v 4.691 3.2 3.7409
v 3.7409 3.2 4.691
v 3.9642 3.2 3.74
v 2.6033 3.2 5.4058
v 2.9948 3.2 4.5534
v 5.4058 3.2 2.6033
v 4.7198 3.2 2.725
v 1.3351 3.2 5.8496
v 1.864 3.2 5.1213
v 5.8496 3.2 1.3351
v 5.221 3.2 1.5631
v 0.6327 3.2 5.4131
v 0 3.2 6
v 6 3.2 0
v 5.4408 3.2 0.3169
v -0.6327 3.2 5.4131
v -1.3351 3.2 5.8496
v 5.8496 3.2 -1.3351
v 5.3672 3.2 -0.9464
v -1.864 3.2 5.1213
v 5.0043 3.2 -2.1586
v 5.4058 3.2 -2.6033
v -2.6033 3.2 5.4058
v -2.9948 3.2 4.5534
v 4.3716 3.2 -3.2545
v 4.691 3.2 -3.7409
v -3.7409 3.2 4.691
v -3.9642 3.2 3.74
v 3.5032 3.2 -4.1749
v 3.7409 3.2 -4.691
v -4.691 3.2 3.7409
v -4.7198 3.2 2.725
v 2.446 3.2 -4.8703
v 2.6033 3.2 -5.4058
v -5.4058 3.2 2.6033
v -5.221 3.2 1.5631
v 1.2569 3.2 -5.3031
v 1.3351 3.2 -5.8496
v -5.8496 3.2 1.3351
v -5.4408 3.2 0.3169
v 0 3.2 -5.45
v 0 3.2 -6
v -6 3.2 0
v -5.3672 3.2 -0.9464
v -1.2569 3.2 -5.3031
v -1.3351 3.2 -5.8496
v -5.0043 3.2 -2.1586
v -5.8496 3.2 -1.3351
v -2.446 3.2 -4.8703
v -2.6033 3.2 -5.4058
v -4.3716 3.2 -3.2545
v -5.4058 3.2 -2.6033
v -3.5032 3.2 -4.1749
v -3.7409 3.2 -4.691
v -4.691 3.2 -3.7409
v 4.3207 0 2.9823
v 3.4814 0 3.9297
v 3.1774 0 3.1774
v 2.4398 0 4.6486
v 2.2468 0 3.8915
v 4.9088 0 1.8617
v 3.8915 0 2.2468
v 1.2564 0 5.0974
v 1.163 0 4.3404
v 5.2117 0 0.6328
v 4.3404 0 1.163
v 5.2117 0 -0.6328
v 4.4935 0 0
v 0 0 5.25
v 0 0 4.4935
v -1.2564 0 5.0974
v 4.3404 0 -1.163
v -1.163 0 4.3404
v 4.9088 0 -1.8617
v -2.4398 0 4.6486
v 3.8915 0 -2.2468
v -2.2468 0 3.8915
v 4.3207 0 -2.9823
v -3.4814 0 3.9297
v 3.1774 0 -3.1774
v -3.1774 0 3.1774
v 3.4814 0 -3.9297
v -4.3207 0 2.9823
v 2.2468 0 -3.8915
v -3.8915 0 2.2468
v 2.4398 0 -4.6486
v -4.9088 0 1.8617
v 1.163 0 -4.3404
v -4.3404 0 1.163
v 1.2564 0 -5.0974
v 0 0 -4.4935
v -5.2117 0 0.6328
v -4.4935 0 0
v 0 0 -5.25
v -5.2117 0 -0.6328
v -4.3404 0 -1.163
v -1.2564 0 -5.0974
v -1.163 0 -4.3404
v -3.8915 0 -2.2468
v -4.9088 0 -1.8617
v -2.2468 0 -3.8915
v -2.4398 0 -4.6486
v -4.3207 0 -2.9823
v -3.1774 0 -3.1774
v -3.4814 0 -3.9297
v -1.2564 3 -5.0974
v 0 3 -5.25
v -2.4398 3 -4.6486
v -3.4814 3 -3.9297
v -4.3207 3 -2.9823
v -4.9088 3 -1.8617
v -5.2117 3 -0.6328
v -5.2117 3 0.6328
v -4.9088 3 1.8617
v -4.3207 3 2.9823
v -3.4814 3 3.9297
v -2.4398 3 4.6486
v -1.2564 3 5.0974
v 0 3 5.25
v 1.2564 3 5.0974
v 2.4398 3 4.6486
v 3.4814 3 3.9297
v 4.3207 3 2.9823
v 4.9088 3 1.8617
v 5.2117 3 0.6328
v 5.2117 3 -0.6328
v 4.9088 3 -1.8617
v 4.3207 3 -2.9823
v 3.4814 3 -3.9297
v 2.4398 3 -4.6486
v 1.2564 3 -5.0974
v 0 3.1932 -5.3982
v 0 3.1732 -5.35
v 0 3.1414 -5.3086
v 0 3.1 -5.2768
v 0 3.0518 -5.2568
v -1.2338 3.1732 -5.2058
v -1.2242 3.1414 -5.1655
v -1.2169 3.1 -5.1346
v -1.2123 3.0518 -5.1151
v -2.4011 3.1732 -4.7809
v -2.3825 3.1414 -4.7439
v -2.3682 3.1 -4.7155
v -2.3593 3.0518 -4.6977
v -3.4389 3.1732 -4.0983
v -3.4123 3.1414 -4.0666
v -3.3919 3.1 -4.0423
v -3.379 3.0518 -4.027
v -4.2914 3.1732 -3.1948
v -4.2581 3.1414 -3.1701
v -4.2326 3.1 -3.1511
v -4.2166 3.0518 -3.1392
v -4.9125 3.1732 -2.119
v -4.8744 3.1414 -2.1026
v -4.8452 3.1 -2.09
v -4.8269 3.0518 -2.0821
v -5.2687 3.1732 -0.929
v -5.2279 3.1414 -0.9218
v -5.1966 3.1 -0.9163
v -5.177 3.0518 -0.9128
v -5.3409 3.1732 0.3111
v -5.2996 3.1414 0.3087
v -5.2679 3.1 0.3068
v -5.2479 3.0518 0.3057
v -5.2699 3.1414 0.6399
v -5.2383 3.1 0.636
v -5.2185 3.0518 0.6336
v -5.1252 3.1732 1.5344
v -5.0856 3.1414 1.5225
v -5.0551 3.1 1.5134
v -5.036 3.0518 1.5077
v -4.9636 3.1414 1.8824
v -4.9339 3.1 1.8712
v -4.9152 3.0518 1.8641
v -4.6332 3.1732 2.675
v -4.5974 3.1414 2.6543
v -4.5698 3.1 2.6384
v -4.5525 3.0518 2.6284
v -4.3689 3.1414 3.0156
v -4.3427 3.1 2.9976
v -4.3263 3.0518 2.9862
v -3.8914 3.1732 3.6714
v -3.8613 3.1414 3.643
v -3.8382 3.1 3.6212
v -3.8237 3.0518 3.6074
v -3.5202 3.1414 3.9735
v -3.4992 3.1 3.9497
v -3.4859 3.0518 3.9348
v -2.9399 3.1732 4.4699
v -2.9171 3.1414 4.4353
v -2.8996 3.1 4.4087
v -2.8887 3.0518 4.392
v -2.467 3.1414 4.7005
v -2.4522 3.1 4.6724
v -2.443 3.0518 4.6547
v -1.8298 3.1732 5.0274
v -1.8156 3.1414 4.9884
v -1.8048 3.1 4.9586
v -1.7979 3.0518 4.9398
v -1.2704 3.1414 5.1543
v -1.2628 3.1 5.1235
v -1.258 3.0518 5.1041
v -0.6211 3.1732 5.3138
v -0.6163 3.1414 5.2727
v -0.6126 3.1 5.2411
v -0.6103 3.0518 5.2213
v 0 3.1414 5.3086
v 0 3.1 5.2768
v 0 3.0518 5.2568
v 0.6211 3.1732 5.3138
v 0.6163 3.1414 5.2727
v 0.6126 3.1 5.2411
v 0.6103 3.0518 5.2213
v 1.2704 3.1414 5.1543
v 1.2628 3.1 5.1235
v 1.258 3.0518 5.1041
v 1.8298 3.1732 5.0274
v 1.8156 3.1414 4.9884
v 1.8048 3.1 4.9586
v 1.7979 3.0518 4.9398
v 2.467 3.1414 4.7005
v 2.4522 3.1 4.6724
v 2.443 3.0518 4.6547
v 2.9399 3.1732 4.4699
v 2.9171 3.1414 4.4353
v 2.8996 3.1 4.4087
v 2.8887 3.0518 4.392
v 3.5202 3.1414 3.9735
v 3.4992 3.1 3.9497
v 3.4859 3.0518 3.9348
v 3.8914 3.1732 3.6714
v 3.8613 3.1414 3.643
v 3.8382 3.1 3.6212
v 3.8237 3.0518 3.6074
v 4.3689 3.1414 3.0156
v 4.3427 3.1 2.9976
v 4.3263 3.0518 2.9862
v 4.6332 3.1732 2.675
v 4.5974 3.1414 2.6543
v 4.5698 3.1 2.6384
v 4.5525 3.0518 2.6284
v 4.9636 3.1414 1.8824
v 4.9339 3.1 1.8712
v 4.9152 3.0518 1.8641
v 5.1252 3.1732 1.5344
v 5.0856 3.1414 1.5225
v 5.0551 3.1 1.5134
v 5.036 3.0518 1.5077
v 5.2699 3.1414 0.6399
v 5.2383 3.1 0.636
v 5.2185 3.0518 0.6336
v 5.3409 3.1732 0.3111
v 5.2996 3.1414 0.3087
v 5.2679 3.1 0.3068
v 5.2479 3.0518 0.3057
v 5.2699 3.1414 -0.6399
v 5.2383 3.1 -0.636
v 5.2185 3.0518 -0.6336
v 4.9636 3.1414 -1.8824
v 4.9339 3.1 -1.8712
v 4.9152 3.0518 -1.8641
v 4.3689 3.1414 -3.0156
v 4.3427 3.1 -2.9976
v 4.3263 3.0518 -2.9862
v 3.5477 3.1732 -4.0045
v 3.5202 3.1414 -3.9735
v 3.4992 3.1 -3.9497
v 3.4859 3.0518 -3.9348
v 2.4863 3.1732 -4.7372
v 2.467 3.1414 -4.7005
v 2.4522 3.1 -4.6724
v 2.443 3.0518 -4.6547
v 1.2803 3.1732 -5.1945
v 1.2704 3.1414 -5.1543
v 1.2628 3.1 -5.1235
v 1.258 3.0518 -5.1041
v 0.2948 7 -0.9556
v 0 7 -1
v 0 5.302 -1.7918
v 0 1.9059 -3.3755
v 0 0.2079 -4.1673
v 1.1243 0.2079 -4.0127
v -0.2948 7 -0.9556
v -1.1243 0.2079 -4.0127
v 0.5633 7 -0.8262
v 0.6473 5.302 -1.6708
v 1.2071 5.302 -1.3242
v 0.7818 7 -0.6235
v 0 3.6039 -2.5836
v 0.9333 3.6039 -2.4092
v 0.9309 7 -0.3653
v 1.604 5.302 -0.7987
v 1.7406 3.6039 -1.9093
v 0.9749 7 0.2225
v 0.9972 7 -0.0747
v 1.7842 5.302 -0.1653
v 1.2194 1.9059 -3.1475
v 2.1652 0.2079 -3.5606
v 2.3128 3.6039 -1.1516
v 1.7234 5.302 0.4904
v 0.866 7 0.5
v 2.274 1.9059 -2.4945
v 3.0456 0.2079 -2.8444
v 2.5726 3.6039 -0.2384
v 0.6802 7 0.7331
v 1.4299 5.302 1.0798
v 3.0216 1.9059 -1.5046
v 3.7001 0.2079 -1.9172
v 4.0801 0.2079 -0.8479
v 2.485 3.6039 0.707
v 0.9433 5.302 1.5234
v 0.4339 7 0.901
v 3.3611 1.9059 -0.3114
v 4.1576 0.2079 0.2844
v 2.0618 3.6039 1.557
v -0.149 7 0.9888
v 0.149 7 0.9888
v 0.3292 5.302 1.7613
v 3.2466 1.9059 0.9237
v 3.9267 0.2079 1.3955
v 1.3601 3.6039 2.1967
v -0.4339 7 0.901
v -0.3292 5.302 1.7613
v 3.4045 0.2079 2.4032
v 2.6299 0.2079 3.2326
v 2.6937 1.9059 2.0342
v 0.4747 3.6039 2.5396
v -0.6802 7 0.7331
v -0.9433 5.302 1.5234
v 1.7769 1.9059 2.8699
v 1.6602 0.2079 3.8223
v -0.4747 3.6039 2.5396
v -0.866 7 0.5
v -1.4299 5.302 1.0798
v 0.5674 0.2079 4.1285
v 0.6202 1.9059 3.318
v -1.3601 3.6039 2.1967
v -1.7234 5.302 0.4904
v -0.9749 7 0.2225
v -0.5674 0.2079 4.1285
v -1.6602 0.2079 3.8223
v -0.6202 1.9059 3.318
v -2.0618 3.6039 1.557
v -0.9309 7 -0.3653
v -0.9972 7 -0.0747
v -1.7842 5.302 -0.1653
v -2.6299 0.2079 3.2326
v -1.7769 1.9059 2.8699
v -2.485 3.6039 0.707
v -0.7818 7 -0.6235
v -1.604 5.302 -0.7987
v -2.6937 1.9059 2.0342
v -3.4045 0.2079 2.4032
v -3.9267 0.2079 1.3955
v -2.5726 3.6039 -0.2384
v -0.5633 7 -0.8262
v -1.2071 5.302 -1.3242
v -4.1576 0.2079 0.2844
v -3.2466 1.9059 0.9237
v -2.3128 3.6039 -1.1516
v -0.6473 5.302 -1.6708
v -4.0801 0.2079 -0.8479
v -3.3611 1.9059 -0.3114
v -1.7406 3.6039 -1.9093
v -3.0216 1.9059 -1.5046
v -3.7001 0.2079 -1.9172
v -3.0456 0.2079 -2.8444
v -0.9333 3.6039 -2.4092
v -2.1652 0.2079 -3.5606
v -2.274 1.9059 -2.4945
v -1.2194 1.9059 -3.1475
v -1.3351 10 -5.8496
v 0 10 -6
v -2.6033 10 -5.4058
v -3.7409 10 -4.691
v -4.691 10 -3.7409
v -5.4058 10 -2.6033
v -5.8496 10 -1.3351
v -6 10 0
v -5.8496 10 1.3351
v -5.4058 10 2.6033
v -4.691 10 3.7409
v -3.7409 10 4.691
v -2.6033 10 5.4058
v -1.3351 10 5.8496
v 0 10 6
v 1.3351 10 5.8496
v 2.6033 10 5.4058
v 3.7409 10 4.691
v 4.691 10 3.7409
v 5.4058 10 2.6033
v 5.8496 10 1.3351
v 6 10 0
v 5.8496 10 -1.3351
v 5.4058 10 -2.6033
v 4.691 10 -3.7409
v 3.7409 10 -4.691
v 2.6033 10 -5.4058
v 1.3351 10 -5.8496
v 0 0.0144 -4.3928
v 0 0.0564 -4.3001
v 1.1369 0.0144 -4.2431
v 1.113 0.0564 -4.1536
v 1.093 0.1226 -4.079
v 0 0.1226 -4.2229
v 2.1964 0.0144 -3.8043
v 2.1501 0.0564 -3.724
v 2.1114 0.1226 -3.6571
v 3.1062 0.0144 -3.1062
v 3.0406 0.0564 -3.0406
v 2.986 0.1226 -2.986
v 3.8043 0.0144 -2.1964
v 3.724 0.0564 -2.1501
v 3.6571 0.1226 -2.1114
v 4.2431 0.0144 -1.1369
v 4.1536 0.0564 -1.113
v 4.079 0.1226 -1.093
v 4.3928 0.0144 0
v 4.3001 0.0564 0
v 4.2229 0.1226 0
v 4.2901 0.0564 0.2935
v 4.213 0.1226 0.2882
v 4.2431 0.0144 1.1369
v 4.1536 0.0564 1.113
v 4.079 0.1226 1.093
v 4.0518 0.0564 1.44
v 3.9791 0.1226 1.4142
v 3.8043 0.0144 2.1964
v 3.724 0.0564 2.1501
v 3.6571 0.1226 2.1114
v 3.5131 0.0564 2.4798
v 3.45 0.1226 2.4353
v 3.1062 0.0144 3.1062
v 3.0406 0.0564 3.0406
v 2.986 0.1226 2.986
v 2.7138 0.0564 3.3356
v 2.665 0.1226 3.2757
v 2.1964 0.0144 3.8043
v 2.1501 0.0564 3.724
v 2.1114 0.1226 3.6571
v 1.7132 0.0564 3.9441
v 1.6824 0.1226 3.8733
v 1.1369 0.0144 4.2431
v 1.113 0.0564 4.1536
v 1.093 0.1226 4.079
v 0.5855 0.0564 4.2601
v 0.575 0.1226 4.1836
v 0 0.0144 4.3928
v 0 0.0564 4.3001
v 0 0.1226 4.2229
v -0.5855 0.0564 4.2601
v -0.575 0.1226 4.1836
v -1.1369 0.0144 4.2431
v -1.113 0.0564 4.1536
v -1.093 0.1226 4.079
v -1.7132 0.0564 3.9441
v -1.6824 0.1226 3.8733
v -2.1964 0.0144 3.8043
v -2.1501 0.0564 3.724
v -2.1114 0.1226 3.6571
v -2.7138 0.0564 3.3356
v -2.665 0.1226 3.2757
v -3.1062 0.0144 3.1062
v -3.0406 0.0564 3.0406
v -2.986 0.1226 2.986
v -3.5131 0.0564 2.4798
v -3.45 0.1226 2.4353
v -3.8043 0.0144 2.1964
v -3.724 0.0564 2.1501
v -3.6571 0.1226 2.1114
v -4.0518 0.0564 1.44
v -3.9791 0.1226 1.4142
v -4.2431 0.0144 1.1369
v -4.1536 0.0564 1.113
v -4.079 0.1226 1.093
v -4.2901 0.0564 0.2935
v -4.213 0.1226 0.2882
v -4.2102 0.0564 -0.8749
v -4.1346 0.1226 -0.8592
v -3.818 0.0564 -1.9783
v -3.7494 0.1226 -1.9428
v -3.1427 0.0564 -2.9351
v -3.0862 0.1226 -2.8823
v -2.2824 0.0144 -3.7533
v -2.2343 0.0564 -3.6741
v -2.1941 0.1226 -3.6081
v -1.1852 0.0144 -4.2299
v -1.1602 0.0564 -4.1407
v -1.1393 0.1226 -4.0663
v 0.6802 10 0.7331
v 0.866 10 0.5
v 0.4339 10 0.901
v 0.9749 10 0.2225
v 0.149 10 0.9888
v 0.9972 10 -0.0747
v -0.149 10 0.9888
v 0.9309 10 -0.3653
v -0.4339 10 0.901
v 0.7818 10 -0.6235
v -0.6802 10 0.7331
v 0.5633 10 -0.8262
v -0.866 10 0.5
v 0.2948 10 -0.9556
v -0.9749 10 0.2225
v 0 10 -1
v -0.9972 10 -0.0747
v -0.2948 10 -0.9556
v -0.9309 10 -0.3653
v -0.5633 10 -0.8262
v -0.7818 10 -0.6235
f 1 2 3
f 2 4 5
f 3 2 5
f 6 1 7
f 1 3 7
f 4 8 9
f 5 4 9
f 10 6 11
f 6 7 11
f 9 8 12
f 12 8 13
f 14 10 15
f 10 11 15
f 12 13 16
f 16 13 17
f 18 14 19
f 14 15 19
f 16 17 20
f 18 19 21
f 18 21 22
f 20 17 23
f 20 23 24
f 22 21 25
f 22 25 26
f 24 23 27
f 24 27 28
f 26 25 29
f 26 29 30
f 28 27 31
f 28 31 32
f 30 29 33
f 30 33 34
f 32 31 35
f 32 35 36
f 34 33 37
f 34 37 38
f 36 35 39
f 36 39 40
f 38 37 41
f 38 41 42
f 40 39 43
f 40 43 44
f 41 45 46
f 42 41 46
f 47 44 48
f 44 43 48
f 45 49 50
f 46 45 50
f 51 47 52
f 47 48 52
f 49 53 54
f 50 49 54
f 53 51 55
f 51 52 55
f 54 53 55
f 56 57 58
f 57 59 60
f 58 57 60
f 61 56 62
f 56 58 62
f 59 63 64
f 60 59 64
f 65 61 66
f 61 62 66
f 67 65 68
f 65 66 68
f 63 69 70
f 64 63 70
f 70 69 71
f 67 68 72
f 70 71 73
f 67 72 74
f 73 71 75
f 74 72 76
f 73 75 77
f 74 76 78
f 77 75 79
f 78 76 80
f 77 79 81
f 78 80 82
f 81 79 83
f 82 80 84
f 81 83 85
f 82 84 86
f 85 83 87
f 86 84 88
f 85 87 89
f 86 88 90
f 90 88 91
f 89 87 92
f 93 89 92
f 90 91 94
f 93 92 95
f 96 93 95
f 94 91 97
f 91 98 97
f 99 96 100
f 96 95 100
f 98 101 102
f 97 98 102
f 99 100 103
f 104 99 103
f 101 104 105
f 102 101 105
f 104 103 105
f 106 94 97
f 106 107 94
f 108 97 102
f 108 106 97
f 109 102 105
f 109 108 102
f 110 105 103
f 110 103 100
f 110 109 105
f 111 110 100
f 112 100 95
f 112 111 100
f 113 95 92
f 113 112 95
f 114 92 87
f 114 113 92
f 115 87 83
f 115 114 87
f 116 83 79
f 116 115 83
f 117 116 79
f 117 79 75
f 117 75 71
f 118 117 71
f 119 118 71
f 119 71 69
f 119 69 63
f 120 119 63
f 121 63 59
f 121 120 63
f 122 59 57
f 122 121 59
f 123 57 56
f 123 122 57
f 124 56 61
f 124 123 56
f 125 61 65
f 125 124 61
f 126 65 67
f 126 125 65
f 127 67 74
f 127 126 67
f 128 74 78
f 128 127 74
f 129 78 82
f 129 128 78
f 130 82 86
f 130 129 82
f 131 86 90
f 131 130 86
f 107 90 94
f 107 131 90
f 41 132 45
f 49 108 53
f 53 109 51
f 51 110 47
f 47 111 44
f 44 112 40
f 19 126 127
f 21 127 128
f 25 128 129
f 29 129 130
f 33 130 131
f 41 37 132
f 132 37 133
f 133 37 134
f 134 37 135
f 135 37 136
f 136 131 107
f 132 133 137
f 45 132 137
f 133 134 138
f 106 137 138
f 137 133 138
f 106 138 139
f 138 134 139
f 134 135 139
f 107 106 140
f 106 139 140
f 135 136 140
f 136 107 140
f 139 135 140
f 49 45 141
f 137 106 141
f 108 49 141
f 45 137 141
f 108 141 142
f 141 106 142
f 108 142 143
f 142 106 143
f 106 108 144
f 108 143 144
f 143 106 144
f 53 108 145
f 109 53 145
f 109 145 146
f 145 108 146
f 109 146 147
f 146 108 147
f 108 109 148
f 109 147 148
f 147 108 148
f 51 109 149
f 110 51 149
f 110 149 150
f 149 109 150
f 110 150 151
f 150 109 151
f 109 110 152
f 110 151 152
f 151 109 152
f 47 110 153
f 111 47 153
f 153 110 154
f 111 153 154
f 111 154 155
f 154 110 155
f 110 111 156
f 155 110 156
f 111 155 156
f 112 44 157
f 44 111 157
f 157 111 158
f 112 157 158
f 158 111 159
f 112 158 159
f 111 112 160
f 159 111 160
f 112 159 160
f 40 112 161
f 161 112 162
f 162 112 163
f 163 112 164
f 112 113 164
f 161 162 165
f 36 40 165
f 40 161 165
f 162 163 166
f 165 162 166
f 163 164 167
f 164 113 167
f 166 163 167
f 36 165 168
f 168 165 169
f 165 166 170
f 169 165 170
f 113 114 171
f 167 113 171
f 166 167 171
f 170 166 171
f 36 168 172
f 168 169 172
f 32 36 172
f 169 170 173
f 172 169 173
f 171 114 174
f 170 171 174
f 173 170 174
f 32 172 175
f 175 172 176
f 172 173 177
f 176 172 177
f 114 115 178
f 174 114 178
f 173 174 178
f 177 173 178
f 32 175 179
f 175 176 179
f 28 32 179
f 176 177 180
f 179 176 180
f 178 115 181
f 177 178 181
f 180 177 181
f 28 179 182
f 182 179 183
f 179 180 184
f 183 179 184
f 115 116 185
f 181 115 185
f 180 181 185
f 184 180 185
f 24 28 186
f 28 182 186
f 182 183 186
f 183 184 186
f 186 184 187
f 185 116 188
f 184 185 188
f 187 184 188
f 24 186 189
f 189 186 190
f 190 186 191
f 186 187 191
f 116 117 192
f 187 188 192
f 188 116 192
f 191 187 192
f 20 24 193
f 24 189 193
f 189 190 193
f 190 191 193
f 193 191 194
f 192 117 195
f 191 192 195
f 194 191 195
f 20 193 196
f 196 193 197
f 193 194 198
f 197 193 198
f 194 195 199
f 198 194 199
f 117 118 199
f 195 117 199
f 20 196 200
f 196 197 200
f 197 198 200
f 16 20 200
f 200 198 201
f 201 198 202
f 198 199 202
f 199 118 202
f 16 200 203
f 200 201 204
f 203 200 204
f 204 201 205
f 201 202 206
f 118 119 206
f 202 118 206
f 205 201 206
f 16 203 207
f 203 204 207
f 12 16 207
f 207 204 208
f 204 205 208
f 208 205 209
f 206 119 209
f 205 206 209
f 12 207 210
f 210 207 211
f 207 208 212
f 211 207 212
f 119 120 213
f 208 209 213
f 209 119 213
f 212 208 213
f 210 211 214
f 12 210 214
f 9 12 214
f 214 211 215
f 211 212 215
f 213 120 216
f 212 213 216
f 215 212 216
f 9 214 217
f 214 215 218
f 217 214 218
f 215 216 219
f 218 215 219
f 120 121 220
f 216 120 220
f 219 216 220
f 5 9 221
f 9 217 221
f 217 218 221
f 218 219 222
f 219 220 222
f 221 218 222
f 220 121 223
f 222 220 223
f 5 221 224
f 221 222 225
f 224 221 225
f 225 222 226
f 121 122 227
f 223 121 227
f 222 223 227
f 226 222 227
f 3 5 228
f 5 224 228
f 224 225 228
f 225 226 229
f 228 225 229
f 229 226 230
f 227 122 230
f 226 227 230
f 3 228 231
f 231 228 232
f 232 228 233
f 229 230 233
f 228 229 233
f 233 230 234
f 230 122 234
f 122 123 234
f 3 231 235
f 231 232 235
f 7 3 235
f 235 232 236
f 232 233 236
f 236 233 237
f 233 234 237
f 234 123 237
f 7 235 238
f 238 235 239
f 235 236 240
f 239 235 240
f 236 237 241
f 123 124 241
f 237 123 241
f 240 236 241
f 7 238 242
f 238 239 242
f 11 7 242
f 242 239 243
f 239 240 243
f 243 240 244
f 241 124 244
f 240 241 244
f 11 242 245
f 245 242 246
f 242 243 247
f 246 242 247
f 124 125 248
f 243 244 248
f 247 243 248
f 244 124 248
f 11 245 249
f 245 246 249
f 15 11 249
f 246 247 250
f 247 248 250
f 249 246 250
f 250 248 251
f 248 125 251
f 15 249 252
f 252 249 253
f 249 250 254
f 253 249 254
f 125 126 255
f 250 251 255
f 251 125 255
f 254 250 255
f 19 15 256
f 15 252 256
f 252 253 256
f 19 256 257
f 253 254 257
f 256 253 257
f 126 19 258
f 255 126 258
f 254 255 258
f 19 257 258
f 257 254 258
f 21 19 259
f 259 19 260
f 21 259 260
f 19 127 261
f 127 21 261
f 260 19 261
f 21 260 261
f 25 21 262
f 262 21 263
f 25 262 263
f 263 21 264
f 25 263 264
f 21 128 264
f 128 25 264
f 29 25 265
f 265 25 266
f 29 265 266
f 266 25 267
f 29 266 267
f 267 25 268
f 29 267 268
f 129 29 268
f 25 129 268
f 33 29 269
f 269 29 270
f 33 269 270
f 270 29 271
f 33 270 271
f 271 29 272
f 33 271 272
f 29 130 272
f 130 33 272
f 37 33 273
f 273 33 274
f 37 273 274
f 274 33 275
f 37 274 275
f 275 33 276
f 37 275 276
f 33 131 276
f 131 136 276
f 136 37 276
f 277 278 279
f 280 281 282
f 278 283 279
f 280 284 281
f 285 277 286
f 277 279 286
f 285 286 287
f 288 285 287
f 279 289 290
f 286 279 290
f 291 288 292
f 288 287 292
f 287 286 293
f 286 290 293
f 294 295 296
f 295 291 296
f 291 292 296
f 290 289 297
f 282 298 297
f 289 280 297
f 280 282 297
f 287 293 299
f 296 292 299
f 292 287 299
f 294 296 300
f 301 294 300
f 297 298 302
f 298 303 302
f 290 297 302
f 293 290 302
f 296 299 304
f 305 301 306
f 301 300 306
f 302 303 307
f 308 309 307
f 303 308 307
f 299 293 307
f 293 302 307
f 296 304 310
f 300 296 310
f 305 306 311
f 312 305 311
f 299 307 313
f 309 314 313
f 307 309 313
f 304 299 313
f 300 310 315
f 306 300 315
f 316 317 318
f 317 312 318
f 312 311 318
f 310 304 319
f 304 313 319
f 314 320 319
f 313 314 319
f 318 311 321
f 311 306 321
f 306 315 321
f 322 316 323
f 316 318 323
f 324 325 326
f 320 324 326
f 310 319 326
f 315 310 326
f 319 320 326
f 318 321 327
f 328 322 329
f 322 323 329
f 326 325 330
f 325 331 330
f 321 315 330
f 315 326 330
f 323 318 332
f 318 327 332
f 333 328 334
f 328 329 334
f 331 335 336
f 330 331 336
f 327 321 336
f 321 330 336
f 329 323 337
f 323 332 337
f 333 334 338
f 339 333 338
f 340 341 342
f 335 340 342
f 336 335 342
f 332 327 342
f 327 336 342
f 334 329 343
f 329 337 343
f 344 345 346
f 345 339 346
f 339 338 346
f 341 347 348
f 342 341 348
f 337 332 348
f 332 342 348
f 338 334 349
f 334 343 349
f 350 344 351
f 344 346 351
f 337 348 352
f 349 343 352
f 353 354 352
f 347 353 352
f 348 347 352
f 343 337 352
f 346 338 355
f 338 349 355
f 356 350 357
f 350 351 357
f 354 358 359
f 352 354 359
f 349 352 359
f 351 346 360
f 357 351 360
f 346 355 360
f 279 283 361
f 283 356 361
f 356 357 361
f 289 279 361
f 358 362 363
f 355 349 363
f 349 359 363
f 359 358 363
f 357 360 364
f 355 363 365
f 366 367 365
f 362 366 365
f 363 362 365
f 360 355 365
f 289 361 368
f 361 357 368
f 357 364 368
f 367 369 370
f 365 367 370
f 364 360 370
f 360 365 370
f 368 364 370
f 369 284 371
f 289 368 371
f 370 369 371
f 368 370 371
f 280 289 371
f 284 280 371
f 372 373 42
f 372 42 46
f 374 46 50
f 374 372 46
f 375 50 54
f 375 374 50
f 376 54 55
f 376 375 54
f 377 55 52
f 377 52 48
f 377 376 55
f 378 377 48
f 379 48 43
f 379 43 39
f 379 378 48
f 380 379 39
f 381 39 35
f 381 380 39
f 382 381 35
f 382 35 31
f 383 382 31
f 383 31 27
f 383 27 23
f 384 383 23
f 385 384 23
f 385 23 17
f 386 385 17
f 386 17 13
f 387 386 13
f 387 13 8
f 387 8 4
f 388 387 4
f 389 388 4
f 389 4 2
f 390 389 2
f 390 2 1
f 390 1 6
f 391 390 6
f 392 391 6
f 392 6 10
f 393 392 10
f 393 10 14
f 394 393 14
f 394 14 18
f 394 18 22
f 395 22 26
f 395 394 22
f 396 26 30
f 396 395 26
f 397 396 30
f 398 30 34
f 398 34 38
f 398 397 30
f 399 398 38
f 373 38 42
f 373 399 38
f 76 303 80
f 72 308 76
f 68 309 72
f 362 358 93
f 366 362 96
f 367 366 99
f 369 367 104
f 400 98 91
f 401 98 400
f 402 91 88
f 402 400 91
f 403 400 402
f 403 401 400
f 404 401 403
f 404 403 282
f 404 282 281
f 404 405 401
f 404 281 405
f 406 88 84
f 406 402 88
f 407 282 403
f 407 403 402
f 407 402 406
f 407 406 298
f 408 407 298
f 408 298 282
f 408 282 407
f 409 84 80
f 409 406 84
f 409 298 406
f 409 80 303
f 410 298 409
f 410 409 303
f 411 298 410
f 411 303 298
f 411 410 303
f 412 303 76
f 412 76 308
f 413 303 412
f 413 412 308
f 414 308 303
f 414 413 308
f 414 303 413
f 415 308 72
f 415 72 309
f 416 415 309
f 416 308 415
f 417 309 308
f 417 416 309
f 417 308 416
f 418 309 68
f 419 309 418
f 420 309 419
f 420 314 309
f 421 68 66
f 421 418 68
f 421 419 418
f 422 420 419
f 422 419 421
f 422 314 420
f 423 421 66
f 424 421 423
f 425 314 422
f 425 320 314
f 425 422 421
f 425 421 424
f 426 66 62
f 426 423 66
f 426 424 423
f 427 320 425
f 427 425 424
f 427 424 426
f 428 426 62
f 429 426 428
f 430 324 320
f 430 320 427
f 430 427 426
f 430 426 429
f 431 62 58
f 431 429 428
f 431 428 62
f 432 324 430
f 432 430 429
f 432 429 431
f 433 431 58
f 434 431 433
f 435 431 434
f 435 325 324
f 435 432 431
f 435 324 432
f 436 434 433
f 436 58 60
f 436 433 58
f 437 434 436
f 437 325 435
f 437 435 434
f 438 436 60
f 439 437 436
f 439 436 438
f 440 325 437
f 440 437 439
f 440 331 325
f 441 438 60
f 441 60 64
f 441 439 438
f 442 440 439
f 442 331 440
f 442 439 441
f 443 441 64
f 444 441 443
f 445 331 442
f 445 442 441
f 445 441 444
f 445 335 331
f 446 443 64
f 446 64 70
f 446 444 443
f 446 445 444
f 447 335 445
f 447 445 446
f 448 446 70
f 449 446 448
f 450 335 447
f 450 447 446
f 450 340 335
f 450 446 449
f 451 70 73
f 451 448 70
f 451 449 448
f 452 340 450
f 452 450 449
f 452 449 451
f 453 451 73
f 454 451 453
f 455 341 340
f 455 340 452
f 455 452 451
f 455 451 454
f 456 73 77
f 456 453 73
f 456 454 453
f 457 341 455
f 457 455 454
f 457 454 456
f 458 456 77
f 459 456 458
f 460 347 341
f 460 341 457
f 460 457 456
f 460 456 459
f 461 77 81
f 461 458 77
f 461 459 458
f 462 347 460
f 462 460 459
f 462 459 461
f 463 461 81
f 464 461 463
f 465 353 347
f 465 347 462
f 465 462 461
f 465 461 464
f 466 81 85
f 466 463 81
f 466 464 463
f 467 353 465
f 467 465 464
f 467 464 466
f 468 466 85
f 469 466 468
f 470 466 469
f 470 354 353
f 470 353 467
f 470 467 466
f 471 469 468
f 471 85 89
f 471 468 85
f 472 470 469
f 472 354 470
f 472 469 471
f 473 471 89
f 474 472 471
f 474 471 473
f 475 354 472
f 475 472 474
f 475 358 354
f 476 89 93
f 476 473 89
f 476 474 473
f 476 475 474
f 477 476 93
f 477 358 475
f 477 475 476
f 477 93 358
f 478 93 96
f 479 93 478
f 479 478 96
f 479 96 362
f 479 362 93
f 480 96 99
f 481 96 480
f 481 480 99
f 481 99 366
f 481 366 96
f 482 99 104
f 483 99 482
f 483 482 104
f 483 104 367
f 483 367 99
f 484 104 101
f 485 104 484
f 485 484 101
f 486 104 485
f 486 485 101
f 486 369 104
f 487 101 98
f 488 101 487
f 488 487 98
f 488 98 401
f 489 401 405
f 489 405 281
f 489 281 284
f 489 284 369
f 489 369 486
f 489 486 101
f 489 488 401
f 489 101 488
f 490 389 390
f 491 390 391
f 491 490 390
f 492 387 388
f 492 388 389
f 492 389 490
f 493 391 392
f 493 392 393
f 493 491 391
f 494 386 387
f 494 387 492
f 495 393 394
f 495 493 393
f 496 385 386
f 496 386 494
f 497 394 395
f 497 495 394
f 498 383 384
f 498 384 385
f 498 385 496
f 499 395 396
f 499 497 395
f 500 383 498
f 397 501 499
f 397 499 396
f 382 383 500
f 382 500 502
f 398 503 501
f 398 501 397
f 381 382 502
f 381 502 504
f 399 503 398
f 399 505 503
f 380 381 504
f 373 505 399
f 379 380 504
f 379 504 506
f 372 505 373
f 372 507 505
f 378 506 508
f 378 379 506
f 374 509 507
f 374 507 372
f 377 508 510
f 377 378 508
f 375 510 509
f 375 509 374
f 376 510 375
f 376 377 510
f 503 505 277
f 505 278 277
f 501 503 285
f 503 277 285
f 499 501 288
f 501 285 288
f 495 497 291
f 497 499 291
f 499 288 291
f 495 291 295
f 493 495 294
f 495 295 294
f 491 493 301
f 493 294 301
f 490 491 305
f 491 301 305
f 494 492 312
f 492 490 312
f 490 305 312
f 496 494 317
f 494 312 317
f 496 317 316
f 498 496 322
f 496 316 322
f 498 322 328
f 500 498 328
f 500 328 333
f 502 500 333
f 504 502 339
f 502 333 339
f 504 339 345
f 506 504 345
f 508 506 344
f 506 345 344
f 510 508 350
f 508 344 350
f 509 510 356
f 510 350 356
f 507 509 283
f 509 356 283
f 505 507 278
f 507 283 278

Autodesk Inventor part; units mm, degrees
ref_plane "YZ Plane" through (0, 0, 0) normal (1, 0, 0) x (0, 1, 0)
ref_plane "XZ Plane" through (0, 0, 0) normal (0, 1, 0) x (-1, 0, 0)
ref_plane "XY Plane" through (0, 0, 0) normal (0, 0, 1) x (1, 0, 0)
sketch "Sketch1" plane through (0, 0, 0) normal (1, 0, 0) x (0, 1, 0)
  line L0 (10, -1) -> (7, -1)
  line L1 (0, -1) -> (0, -4.2642) construction
  line L2 (0, -5.25) -> (3.2, -5.25)
  line L3 (3.2, -5.25) -> (3.2, -6)
  line L4 (3.2, -6) -> (10, -6)
  line L5 (10, -6) -> (10, -1)
  line L6 (10, 0) -> (0, 0) construction
  line L7 (-2, 0) -> (12, 0) projected
  line L8 (7, -1) -> (0, -4.2642)
  line L9 (7, -1) -> (0, -1) construction
  line L10 (0, -4.2642) -> (0, -5.25)
  point P0 (0, -4.7571)
  point P1 (5, 0)
  dimension "d2" = 6
  dimension "d3" = 5.25
  dimension "d4" = 6.8
  dimension "d9" = 3
  dimension "d10" = 155
  dimension "d11" = 1
  dimension "d12" = 10
  dimension "d13" = 5
  dimension "d16" = 3.2
revolve "Revolution1" add sketch "Sketch1" angle 360 about axis through (0, -10, 0) along (0, 1, 0)
fillet "Fillet1" radius 0.2 1 edges at (0, 3.2, 5.25)
fillet "Fillet2" radius 0.36 1 edges at (0, 0, 4.2642)
properties part number "tapon optica SiPM"
